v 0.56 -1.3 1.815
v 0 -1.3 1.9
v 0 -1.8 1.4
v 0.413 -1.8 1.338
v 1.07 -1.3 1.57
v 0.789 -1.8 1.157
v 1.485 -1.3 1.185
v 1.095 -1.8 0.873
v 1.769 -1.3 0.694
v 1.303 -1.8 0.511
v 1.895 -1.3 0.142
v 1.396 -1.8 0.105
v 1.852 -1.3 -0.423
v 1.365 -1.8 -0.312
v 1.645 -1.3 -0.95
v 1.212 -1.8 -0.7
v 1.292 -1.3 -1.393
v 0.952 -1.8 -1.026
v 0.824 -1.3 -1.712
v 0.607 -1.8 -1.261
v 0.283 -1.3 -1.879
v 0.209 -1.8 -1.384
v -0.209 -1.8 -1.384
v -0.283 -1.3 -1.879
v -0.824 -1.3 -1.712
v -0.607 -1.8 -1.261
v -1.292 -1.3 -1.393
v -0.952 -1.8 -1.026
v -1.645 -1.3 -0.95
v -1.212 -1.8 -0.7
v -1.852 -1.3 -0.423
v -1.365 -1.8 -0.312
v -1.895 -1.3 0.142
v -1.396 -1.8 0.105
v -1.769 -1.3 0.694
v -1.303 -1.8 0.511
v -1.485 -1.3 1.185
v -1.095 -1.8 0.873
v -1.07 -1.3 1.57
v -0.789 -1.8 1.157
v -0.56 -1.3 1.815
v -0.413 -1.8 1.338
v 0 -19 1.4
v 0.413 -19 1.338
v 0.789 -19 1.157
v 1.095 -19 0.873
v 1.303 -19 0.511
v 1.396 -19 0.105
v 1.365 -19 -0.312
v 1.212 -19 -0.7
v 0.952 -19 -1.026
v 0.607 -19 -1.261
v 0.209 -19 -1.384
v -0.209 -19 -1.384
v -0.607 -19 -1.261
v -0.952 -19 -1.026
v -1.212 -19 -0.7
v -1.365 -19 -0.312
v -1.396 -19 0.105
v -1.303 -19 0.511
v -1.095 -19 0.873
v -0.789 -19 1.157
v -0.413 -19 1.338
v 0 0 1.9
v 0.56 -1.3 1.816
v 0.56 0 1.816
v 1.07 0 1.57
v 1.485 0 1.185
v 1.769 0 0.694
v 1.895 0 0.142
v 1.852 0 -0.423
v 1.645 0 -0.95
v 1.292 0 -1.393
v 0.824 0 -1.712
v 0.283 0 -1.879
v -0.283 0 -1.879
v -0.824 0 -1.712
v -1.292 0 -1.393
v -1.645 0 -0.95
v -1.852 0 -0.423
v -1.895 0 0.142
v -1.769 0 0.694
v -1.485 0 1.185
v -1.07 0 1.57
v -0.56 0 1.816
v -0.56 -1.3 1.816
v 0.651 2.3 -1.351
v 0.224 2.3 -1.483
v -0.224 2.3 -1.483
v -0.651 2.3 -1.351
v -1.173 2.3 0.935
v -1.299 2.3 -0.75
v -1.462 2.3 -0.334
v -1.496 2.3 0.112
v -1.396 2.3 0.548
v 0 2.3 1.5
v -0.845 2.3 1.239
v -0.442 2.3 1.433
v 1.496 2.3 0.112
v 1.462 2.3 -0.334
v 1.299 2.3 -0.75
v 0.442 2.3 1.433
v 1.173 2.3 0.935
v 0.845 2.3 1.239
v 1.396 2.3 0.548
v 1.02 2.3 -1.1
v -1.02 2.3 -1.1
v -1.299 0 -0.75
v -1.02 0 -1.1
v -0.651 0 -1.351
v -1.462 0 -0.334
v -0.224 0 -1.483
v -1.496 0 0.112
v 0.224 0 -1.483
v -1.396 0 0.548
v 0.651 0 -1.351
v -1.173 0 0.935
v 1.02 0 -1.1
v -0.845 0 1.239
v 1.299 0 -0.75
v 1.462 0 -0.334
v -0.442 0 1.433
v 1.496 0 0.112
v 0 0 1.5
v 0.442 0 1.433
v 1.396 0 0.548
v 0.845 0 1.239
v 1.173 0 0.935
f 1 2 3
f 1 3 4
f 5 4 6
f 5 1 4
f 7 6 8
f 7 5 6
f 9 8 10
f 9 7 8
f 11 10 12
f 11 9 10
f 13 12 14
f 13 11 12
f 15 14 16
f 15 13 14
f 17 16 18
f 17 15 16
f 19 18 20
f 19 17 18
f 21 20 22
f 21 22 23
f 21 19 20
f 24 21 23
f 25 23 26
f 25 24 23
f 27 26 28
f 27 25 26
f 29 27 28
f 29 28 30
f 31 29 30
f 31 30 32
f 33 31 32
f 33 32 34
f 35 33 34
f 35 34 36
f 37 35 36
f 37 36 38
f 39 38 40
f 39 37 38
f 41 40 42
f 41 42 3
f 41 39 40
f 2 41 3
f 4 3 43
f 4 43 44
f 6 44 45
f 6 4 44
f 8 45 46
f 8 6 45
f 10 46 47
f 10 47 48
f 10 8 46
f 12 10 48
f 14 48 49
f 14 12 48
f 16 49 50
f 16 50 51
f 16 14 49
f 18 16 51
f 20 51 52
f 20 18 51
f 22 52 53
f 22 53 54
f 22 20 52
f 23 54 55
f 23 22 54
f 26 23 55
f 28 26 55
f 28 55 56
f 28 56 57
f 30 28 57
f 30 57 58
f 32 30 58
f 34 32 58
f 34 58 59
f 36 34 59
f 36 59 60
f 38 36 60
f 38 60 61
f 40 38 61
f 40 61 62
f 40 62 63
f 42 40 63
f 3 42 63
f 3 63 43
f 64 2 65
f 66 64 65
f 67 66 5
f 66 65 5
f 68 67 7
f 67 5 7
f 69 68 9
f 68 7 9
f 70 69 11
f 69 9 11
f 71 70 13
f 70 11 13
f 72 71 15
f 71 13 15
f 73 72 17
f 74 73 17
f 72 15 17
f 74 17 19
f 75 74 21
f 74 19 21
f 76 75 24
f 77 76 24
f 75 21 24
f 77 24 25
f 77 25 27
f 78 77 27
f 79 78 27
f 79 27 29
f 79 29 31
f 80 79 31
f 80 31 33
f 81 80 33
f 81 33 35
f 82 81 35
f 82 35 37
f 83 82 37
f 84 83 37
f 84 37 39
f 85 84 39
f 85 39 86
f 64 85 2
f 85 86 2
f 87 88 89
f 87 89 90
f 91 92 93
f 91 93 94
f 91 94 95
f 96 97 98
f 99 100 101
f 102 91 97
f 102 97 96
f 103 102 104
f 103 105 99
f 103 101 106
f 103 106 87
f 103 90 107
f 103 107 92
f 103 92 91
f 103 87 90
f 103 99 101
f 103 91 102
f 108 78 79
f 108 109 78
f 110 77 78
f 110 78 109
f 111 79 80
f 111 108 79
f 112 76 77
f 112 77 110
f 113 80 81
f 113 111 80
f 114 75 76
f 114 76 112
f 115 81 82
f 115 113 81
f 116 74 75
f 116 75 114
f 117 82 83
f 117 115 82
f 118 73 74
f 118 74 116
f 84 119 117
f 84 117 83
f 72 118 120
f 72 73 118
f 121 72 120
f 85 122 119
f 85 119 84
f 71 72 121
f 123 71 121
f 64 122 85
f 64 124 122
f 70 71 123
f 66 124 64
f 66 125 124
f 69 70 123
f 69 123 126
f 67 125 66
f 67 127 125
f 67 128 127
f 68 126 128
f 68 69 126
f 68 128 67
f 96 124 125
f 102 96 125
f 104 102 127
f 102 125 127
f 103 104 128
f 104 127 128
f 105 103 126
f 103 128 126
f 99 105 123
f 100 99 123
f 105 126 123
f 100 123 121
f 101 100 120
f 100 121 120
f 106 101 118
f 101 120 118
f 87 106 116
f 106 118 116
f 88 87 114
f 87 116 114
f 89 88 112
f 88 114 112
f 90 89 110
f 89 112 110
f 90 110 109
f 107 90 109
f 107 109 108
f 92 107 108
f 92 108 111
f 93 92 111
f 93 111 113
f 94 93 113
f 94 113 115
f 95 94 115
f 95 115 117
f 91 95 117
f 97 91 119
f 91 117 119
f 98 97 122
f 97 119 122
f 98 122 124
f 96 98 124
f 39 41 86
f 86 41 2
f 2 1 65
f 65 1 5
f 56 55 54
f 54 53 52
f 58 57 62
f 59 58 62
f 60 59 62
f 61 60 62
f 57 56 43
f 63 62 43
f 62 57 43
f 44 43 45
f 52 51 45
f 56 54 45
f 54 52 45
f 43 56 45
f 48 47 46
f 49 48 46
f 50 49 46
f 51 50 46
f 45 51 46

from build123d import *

# Parameters (mm, degrees)
SKETCH1_R           = 1.5
SKETCH1_R_2         = 1.4
BOSS_EXTRUDE1_DEPTH = 2.3
BOSS_EXTRUDE2_START = -1.3
SKETCH1_4_R         = 1.9
SKETCH1_4_R_2       = 1.5
SKETCH1_4_R_3       = 1.4
BOSS_EXTRUDE2_DEPTH = 1.3
SKETCH1_5_R         = 1.4
BOSS_EXTRUDE3_DEPTH = 19
CHAMFER1_SIZE       = 0.5


with BuildPart() as part:
    # Sketch1 → Boss-Extrude1 (new body)
    # profile 1 of 2: a face of its own
    with BuildSketch(Plane(origin=(0, 0, 0), x_dir=(1, 0, 0), z_dir=(0, 1, 0))):
        with Locations(Location((0, 0, 0), (0, 0, 270))):
            Circle(SKETCH1_R)
        Circle(SKETCH1_R_2, mode=Mode.SUBTRACT)
    # profile 2 of 2: a face of its own
    with BuildSketch(Plane(origin=(0, 0, 0), x_dir=(1, 0, 0), z_dir=(0, 1, 0))):
        Circle(SKETCH1_R_2)
    extrude(amount=BOSS_EXTRUDE1_DEPTH)

    # Sketch1<4> → Boss-Extrude2 (add)
    # profile 1 of 3: a face of its own
    with BuildSketch(Plane(origin=(0, 0, 0), x_dir=(1, 0, 0), z_dir=(0, 1, 0)).offset(BOSS_EXTRUDE2_START)):
        with Locations(Location((0, 0, 0), (0, 0, 270))):
            Circle(SKETCH1_4_R)
        with Locations(Location((0, 0, 0), (0, 0, 270))):
            Circle(SKETCH1_4_R_2, mode=Mode.SUBTRACT)
    # profile 2 of 3: a face of its own
    with BuildSketch(Plane(origin=(0, 0, 0), x_dir=(1, 0, 0), z_dir=(0, 1, 0)).offset(BOSS_EXTRUDE2_START)):
        with Locations(Location((0, 0, 0), (0, 0, 270))):
            Circle(SKETCH1_4_R_2)
        Circle(SKETCH1_4_R_3, mode=Mode.SUBTRACT)
    # profile 3 of 3: a face of its own
    with BuildSketch(Plane(origin=(0, 0, 0), x_dir=(1, 0, 0), z_dir=(0, 1, 0)).offset(BOSS_EXTRUDE2_START)):
        Circle(SKETCH1_4_R_3)
    extrude(amount=BOSS_EXTRUDE2_DEPTH)

    # Sketch1<5> → Boss-Extrude3 (add)
    with BuildSketch(Plane(origin=(0, 0, 0), x_dir=(1, 0, 0), z_dir=(0, 1, 0))):
        with Locations(Location((0, 0, 0), (0, 0, 270))):
            Circle(SKETCH1_5_R)
    extrude(amount=-BOSS_EXTRUDE3_DEPTH)

    # Chamfer1
    chamfer1_edges = [part.edges().sort_by_distance(p)[0] for p in [
        (0, -1.3, -1.4),
    ]]
    chamfer(chamfer1_edges, length=CHAMFER1_SIZE - 0.0001)  # a hair under: the kernel refuses the full size


solid = part.part
